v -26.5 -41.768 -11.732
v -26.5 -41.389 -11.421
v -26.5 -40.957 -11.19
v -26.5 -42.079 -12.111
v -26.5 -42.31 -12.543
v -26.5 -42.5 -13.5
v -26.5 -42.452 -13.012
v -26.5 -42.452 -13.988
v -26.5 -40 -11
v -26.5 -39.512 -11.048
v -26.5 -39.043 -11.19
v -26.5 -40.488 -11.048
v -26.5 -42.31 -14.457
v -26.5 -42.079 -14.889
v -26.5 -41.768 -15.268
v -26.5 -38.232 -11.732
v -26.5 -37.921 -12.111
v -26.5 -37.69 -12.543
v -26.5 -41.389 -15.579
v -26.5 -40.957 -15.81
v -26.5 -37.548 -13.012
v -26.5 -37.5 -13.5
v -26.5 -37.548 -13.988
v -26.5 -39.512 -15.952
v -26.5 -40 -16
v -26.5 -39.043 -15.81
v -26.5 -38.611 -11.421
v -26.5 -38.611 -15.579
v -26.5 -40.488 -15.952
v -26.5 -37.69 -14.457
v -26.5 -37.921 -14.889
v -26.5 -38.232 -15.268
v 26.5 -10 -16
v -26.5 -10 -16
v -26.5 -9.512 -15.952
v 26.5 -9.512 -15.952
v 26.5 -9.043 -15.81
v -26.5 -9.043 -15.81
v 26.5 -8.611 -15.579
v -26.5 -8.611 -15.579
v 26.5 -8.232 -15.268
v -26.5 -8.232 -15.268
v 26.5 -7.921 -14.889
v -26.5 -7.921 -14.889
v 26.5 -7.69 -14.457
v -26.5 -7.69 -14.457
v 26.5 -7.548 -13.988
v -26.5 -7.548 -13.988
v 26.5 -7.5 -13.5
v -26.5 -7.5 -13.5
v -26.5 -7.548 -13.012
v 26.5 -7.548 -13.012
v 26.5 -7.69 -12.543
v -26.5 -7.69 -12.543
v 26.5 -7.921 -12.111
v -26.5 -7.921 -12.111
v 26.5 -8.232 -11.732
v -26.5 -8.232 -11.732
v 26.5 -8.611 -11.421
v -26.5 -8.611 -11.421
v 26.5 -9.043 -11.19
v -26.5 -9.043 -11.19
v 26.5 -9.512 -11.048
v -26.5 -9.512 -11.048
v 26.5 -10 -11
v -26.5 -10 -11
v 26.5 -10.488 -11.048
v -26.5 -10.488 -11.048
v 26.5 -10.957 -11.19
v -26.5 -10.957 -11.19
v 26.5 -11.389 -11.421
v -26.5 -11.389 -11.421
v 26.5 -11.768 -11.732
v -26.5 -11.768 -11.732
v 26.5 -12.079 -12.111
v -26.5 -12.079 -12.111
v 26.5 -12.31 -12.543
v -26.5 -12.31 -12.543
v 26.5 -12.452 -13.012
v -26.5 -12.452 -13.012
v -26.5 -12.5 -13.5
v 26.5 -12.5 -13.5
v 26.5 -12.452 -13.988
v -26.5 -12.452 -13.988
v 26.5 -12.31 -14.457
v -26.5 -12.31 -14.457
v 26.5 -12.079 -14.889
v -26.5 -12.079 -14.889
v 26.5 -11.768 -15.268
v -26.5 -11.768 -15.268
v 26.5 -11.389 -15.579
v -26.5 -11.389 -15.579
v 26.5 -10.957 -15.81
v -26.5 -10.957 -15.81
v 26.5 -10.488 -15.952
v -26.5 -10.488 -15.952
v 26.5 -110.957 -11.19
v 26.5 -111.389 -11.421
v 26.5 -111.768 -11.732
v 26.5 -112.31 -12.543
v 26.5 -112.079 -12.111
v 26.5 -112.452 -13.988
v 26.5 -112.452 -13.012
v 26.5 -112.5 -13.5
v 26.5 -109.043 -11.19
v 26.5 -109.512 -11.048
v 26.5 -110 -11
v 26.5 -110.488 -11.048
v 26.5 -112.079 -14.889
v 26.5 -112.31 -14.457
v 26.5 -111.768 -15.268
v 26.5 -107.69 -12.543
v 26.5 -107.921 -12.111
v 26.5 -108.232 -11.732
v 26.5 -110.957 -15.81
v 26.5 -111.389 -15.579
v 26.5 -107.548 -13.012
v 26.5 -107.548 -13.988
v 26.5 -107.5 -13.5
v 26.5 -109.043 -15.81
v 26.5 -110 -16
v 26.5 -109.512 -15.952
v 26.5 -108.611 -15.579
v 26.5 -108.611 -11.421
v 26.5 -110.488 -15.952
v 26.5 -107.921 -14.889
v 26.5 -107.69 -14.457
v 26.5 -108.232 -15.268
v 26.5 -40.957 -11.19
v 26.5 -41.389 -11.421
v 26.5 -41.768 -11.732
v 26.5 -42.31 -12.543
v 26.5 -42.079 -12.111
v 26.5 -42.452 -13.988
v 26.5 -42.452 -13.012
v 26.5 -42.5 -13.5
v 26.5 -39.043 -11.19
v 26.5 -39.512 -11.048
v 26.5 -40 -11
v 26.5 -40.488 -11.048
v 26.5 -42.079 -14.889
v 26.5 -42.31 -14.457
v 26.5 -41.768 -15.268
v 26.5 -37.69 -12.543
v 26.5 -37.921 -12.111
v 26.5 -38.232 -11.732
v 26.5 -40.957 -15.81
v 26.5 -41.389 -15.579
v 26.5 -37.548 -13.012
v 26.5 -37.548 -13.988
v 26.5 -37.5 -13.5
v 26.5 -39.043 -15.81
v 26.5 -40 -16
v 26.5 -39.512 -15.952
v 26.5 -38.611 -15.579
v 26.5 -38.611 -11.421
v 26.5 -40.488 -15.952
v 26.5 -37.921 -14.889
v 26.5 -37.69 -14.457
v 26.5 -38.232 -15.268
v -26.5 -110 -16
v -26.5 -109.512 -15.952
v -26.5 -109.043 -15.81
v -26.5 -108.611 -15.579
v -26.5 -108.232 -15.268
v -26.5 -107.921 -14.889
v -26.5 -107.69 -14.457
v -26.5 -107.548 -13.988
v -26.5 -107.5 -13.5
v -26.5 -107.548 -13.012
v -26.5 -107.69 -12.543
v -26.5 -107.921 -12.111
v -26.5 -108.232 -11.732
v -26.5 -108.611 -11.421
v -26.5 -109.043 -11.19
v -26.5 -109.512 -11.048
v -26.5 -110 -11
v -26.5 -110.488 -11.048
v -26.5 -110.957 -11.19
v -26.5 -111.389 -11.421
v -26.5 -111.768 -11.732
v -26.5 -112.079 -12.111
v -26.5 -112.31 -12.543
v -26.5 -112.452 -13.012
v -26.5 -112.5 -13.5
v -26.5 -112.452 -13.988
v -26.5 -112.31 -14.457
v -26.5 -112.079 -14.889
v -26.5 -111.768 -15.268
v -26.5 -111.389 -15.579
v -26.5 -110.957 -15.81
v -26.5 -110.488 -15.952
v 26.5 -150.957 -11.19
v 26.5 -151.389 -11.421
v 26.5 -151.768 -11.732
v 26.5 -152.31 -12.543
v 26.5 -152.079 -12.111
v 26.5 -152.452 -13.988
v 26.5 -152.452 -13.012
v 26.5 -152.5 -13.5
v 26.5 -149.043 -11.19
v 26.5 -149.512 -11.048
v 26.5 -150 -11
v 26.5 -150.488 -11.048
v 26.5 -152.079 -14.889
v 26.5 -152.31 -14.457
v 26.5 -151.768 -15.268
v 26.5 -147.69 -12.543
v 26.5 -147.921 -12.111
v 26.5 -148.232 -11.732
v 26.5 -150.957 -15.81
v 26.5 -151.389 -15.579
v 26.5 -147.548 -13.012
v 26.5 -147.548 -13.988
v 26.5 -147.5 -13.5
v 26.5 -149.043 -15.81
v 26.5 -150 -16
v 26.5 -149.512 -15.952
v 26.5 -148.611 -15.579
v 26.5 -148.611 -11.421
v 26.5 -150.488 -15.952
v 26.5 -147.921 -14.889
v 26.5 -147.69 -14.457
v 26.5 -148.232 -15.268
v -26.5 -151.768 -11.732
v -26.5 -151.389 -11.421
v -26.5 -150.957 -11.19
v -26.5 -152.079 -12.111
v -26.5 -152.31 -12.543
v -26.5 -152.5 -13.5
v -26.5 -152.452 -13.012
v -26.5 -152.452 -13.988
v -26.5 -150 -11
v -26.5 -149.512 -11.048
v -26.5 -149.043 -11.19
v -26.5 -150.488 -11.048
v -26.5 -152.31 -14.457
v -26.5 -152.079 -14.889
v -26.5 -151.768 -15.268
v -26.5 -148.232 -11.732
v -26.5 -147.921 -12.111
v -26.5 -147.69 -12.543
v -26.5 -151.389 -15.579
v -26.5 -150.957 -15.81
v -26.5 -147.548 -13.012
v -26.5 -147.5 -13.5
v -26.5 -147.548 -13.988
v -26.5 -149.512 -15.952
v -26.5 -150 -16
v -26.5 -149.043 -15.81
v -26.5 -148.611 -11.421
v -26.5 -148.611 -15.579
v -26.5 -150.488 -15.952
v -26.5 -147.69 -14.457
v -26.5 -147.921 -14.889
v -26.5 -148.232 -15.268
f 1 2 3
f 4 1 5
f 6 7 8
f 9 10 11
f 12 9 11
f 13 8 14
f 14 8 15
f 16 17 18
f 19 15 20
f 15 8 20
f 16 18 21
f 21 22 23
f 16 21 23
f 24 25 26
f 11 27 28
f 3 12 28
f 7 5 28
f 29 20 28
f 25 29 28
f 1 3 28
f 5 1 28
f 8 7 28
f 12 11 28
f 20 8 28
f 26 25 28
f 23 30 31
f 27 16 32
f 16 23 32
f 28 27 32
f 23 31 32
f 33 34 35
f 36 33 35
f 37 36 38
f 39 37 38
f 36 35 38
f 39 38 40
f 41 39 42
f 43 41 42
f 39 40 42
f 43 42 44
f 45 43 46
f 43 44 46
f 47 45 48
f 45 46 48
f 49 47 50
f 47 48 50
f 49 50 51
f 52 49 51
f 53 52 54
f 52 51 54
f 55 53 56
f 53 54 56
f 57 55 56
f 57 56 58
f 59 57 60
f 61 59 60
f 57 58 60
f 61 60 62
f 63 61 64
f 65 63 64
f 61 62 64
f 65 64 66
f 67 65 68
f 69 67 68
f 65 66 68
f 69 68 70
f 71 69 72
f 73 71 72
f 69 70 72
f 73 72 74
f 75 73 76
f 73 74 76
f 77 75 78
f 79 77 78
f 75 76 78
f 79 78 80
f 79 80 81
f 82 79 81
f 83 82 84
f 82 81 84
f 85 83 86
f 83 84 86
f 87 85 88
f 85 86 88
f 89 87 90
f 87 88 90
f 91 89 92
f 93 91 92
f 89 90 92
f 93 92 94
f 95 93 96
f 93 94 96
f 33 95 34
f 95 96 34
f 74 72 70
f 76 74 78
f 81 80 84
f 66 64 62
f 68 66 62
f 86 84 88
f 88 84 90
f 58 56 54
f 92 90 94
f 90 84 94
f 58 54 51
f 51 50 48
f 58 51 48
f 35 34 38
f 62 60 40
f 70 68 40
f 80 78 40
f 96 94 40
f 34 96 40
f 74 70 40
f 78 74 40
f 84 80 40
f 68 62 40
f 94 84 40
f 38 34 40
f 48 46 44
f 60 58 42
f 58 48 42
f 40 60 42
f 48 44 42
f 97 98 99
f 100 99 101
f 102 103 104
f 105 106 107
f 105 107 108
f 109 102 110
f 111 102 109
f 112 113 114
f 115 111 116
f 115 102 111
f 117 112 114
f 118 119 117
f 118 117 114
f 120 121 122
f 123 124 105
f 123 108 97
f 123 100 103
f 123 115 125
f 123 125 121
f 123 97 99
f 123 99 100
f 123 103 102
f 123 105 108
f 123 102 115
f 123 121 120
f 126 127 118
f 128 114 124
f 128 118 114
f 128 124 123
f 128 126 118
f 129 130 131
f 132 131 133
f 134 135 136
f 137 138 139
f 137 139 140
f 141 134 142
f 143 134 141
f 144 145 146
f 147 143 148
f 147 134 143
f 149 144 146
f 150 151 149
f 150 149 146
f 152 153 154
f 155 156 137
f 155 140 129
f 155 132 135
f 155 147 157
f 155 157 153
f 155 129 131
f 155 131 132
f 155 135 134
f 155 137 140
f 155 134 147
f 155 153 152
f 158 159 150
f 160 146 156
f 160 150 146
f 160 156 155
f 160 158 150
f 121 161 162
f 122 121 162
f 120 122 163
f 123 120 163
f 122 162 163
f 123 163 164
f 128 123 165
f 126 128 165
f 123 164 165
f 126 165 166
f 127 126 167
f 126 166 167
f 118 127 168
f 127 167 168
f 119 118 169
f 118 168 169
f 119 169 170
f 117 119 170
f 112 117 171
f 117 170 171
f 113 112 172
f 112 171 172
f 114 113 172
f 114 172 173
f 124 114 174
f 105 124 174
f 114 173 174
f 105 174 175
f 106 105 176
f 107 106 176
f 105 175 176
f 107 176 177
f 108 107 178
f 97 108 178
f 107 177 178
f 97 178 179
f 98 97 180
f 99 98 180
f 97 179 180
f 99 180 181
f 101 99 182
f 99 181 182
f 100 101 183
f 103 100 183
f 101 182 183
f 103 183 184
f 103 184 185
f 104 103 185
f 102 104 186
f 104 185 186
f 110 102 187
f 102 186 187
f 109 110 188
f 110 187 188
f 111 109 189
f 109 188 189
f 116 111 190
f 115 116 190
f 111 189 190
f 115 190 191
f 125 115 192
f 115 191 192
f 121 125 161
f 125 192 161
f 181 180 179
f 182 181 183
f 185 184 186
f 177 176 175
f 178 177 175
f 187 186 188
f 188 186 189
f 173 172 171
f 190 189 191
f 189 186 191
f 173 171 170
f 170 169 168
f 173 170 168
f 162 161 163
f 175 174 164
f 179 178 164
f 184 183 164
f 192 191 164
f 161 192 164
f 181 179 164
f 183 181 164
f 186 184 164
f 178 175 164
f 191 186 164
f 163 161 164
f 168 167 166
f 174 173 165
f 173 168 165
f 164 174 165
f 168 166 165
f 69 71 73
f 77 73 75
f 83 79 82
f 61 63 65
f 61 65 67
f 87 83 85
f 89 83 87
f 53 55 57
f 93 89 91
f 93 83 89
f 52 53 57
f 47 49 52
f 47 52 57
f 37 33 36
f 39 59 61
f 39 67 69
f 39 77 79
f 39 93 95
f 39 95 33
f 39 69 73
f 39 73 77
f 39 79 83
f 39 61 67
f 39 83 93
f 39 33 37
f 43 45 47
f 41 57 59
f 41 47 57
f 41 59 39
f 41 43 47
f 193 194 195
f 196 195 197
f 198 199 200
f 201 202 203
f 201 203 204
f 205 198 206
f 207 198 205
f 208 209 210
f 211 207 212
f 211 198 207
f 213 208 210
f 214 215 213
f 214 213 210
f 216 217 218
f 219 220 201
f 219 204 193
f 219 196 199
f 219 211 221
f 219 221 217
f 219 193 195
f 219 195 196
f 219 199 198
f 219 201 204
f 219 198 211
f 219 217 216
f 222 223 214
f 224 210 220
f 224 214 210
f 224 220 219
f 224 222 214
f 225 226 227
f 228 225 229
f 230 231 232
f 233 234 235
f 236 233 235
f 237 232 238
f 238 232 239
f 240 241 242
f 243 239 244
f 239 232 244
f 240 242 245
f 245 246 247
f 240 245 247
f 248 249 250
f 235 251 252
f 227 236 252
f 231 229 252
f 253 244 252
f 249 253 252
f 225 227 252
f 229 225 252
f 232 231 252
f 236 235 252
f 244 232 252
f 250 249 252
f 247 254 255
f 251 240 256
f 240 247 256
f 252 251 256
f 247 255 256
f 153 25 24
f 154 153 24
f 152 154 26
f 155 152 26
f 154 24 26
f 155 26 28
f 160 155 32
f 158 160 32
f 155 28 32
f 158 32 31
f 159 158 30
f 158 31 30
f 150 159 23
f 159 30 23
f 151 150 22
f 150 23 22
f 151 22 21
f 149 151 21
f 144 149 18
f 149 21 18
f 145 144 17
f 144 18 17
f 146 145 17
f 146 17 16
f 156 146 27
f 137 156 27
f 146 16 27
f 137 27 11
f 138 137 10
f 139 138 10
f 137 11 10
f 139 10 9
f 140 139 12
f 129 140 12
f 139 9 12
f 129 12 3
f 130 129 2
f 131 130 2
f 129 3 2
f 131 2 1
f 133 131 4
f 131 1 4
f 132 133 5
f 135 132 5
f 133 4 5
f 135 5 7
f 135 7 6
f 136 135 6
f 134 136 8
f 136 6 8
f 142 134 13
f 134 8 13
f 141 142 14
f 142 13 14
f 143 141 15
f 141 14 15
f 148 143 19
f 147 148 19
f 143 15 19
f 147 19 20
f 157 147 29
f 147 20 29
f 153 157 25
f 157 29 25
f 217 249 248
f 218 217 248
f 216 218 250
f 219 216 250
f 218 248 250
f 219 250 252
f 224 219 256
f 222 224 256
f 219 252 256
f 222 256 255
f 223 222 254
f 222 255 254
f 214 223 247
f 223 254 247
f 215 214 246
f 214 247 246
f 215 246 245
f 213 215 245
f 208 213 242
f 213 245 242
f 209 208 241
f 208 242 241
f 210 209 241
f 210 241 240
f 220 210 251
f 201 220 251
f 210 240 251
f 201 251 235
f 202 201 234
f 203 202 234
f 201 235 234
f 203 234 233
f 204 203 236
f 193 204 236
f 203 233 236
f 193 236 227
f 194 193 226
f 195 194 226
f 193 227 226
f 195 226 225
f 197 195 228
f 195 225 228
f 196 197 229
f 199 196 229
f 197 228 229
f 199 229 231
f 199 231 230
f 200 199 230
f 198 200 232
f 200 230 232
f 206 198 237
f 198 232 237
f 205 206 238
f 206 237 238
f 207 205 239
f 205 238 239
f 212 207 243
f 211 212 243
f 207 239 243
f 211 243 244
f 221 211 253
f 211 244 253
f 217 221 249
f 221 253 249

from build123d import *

# Parameters (mm, degrees)
CYLINDER062_R     = 2.5
CYLINDER062_DEPTH = 53
CYLINDER061_R     = 2.5
CYLINDER061_DEPTH = 53
CYLINDER060_R     = 2.5
CYLINDER060_DEPTH = 53
CYLINDER059_R     = 2.5
CYLINDER059_DEPTH = 53


with BuildPart() as cylinder061:
    # Cylinder062 → Cylinder062 (new body)
    with BuildSketch(Plane(origin=(-26.5, -40, -13.5), x_dir=(0, 0, -1), z_dir=(1, 0, 0))):
        Circle(CYLINDER062_R)
    extrude(amount=CYLINDER062_DEPTH)


with BuildPart() as fusion023:
    # Cylinder061 → Cylinder061 (new body)
    with BuildSketch(Plane(origin=(-26.5, -10, -13.5), x_dir=(0, 0, -1), z_dir=(1, 0, 0))):
        Circle(CYLINDER061_R)
    extrude(amount=CYLINDER061_DEPTH)

    # Fusion023: union Cylinder061
    add(cylinder061.part)


with BuildPart() as cylinder059:
    # Cylinder060 → Cylinder060 (new body)
    with BuildSketch(Plane(origin=(-26.5, -110, -13.5), x_dir=(0, 0, -1), z_dir=(1, 0, 0))):
        Circle(CYLINDER060_R)
    extrude(amount=CYLINDER060_DEPTH)


with BuildPart() as fusion024:
    # Cylinder059 → Cylinder059 (new body)
    with BuildSketch(Plane(origin=(-26.5, -150, -13.5), x_dir=(0, 0, -1), z_dir=(1, 0, 0))):
        Circle(CYLINDER059_R)
    extrude(amount=CYLINDER059_DEPTH)

    # Fusion022: union Cylinder059
    add(cylinder059.part)

    # Fusion024: union Fusion023
    add(fusion023.part)


solid = fusion024.part
